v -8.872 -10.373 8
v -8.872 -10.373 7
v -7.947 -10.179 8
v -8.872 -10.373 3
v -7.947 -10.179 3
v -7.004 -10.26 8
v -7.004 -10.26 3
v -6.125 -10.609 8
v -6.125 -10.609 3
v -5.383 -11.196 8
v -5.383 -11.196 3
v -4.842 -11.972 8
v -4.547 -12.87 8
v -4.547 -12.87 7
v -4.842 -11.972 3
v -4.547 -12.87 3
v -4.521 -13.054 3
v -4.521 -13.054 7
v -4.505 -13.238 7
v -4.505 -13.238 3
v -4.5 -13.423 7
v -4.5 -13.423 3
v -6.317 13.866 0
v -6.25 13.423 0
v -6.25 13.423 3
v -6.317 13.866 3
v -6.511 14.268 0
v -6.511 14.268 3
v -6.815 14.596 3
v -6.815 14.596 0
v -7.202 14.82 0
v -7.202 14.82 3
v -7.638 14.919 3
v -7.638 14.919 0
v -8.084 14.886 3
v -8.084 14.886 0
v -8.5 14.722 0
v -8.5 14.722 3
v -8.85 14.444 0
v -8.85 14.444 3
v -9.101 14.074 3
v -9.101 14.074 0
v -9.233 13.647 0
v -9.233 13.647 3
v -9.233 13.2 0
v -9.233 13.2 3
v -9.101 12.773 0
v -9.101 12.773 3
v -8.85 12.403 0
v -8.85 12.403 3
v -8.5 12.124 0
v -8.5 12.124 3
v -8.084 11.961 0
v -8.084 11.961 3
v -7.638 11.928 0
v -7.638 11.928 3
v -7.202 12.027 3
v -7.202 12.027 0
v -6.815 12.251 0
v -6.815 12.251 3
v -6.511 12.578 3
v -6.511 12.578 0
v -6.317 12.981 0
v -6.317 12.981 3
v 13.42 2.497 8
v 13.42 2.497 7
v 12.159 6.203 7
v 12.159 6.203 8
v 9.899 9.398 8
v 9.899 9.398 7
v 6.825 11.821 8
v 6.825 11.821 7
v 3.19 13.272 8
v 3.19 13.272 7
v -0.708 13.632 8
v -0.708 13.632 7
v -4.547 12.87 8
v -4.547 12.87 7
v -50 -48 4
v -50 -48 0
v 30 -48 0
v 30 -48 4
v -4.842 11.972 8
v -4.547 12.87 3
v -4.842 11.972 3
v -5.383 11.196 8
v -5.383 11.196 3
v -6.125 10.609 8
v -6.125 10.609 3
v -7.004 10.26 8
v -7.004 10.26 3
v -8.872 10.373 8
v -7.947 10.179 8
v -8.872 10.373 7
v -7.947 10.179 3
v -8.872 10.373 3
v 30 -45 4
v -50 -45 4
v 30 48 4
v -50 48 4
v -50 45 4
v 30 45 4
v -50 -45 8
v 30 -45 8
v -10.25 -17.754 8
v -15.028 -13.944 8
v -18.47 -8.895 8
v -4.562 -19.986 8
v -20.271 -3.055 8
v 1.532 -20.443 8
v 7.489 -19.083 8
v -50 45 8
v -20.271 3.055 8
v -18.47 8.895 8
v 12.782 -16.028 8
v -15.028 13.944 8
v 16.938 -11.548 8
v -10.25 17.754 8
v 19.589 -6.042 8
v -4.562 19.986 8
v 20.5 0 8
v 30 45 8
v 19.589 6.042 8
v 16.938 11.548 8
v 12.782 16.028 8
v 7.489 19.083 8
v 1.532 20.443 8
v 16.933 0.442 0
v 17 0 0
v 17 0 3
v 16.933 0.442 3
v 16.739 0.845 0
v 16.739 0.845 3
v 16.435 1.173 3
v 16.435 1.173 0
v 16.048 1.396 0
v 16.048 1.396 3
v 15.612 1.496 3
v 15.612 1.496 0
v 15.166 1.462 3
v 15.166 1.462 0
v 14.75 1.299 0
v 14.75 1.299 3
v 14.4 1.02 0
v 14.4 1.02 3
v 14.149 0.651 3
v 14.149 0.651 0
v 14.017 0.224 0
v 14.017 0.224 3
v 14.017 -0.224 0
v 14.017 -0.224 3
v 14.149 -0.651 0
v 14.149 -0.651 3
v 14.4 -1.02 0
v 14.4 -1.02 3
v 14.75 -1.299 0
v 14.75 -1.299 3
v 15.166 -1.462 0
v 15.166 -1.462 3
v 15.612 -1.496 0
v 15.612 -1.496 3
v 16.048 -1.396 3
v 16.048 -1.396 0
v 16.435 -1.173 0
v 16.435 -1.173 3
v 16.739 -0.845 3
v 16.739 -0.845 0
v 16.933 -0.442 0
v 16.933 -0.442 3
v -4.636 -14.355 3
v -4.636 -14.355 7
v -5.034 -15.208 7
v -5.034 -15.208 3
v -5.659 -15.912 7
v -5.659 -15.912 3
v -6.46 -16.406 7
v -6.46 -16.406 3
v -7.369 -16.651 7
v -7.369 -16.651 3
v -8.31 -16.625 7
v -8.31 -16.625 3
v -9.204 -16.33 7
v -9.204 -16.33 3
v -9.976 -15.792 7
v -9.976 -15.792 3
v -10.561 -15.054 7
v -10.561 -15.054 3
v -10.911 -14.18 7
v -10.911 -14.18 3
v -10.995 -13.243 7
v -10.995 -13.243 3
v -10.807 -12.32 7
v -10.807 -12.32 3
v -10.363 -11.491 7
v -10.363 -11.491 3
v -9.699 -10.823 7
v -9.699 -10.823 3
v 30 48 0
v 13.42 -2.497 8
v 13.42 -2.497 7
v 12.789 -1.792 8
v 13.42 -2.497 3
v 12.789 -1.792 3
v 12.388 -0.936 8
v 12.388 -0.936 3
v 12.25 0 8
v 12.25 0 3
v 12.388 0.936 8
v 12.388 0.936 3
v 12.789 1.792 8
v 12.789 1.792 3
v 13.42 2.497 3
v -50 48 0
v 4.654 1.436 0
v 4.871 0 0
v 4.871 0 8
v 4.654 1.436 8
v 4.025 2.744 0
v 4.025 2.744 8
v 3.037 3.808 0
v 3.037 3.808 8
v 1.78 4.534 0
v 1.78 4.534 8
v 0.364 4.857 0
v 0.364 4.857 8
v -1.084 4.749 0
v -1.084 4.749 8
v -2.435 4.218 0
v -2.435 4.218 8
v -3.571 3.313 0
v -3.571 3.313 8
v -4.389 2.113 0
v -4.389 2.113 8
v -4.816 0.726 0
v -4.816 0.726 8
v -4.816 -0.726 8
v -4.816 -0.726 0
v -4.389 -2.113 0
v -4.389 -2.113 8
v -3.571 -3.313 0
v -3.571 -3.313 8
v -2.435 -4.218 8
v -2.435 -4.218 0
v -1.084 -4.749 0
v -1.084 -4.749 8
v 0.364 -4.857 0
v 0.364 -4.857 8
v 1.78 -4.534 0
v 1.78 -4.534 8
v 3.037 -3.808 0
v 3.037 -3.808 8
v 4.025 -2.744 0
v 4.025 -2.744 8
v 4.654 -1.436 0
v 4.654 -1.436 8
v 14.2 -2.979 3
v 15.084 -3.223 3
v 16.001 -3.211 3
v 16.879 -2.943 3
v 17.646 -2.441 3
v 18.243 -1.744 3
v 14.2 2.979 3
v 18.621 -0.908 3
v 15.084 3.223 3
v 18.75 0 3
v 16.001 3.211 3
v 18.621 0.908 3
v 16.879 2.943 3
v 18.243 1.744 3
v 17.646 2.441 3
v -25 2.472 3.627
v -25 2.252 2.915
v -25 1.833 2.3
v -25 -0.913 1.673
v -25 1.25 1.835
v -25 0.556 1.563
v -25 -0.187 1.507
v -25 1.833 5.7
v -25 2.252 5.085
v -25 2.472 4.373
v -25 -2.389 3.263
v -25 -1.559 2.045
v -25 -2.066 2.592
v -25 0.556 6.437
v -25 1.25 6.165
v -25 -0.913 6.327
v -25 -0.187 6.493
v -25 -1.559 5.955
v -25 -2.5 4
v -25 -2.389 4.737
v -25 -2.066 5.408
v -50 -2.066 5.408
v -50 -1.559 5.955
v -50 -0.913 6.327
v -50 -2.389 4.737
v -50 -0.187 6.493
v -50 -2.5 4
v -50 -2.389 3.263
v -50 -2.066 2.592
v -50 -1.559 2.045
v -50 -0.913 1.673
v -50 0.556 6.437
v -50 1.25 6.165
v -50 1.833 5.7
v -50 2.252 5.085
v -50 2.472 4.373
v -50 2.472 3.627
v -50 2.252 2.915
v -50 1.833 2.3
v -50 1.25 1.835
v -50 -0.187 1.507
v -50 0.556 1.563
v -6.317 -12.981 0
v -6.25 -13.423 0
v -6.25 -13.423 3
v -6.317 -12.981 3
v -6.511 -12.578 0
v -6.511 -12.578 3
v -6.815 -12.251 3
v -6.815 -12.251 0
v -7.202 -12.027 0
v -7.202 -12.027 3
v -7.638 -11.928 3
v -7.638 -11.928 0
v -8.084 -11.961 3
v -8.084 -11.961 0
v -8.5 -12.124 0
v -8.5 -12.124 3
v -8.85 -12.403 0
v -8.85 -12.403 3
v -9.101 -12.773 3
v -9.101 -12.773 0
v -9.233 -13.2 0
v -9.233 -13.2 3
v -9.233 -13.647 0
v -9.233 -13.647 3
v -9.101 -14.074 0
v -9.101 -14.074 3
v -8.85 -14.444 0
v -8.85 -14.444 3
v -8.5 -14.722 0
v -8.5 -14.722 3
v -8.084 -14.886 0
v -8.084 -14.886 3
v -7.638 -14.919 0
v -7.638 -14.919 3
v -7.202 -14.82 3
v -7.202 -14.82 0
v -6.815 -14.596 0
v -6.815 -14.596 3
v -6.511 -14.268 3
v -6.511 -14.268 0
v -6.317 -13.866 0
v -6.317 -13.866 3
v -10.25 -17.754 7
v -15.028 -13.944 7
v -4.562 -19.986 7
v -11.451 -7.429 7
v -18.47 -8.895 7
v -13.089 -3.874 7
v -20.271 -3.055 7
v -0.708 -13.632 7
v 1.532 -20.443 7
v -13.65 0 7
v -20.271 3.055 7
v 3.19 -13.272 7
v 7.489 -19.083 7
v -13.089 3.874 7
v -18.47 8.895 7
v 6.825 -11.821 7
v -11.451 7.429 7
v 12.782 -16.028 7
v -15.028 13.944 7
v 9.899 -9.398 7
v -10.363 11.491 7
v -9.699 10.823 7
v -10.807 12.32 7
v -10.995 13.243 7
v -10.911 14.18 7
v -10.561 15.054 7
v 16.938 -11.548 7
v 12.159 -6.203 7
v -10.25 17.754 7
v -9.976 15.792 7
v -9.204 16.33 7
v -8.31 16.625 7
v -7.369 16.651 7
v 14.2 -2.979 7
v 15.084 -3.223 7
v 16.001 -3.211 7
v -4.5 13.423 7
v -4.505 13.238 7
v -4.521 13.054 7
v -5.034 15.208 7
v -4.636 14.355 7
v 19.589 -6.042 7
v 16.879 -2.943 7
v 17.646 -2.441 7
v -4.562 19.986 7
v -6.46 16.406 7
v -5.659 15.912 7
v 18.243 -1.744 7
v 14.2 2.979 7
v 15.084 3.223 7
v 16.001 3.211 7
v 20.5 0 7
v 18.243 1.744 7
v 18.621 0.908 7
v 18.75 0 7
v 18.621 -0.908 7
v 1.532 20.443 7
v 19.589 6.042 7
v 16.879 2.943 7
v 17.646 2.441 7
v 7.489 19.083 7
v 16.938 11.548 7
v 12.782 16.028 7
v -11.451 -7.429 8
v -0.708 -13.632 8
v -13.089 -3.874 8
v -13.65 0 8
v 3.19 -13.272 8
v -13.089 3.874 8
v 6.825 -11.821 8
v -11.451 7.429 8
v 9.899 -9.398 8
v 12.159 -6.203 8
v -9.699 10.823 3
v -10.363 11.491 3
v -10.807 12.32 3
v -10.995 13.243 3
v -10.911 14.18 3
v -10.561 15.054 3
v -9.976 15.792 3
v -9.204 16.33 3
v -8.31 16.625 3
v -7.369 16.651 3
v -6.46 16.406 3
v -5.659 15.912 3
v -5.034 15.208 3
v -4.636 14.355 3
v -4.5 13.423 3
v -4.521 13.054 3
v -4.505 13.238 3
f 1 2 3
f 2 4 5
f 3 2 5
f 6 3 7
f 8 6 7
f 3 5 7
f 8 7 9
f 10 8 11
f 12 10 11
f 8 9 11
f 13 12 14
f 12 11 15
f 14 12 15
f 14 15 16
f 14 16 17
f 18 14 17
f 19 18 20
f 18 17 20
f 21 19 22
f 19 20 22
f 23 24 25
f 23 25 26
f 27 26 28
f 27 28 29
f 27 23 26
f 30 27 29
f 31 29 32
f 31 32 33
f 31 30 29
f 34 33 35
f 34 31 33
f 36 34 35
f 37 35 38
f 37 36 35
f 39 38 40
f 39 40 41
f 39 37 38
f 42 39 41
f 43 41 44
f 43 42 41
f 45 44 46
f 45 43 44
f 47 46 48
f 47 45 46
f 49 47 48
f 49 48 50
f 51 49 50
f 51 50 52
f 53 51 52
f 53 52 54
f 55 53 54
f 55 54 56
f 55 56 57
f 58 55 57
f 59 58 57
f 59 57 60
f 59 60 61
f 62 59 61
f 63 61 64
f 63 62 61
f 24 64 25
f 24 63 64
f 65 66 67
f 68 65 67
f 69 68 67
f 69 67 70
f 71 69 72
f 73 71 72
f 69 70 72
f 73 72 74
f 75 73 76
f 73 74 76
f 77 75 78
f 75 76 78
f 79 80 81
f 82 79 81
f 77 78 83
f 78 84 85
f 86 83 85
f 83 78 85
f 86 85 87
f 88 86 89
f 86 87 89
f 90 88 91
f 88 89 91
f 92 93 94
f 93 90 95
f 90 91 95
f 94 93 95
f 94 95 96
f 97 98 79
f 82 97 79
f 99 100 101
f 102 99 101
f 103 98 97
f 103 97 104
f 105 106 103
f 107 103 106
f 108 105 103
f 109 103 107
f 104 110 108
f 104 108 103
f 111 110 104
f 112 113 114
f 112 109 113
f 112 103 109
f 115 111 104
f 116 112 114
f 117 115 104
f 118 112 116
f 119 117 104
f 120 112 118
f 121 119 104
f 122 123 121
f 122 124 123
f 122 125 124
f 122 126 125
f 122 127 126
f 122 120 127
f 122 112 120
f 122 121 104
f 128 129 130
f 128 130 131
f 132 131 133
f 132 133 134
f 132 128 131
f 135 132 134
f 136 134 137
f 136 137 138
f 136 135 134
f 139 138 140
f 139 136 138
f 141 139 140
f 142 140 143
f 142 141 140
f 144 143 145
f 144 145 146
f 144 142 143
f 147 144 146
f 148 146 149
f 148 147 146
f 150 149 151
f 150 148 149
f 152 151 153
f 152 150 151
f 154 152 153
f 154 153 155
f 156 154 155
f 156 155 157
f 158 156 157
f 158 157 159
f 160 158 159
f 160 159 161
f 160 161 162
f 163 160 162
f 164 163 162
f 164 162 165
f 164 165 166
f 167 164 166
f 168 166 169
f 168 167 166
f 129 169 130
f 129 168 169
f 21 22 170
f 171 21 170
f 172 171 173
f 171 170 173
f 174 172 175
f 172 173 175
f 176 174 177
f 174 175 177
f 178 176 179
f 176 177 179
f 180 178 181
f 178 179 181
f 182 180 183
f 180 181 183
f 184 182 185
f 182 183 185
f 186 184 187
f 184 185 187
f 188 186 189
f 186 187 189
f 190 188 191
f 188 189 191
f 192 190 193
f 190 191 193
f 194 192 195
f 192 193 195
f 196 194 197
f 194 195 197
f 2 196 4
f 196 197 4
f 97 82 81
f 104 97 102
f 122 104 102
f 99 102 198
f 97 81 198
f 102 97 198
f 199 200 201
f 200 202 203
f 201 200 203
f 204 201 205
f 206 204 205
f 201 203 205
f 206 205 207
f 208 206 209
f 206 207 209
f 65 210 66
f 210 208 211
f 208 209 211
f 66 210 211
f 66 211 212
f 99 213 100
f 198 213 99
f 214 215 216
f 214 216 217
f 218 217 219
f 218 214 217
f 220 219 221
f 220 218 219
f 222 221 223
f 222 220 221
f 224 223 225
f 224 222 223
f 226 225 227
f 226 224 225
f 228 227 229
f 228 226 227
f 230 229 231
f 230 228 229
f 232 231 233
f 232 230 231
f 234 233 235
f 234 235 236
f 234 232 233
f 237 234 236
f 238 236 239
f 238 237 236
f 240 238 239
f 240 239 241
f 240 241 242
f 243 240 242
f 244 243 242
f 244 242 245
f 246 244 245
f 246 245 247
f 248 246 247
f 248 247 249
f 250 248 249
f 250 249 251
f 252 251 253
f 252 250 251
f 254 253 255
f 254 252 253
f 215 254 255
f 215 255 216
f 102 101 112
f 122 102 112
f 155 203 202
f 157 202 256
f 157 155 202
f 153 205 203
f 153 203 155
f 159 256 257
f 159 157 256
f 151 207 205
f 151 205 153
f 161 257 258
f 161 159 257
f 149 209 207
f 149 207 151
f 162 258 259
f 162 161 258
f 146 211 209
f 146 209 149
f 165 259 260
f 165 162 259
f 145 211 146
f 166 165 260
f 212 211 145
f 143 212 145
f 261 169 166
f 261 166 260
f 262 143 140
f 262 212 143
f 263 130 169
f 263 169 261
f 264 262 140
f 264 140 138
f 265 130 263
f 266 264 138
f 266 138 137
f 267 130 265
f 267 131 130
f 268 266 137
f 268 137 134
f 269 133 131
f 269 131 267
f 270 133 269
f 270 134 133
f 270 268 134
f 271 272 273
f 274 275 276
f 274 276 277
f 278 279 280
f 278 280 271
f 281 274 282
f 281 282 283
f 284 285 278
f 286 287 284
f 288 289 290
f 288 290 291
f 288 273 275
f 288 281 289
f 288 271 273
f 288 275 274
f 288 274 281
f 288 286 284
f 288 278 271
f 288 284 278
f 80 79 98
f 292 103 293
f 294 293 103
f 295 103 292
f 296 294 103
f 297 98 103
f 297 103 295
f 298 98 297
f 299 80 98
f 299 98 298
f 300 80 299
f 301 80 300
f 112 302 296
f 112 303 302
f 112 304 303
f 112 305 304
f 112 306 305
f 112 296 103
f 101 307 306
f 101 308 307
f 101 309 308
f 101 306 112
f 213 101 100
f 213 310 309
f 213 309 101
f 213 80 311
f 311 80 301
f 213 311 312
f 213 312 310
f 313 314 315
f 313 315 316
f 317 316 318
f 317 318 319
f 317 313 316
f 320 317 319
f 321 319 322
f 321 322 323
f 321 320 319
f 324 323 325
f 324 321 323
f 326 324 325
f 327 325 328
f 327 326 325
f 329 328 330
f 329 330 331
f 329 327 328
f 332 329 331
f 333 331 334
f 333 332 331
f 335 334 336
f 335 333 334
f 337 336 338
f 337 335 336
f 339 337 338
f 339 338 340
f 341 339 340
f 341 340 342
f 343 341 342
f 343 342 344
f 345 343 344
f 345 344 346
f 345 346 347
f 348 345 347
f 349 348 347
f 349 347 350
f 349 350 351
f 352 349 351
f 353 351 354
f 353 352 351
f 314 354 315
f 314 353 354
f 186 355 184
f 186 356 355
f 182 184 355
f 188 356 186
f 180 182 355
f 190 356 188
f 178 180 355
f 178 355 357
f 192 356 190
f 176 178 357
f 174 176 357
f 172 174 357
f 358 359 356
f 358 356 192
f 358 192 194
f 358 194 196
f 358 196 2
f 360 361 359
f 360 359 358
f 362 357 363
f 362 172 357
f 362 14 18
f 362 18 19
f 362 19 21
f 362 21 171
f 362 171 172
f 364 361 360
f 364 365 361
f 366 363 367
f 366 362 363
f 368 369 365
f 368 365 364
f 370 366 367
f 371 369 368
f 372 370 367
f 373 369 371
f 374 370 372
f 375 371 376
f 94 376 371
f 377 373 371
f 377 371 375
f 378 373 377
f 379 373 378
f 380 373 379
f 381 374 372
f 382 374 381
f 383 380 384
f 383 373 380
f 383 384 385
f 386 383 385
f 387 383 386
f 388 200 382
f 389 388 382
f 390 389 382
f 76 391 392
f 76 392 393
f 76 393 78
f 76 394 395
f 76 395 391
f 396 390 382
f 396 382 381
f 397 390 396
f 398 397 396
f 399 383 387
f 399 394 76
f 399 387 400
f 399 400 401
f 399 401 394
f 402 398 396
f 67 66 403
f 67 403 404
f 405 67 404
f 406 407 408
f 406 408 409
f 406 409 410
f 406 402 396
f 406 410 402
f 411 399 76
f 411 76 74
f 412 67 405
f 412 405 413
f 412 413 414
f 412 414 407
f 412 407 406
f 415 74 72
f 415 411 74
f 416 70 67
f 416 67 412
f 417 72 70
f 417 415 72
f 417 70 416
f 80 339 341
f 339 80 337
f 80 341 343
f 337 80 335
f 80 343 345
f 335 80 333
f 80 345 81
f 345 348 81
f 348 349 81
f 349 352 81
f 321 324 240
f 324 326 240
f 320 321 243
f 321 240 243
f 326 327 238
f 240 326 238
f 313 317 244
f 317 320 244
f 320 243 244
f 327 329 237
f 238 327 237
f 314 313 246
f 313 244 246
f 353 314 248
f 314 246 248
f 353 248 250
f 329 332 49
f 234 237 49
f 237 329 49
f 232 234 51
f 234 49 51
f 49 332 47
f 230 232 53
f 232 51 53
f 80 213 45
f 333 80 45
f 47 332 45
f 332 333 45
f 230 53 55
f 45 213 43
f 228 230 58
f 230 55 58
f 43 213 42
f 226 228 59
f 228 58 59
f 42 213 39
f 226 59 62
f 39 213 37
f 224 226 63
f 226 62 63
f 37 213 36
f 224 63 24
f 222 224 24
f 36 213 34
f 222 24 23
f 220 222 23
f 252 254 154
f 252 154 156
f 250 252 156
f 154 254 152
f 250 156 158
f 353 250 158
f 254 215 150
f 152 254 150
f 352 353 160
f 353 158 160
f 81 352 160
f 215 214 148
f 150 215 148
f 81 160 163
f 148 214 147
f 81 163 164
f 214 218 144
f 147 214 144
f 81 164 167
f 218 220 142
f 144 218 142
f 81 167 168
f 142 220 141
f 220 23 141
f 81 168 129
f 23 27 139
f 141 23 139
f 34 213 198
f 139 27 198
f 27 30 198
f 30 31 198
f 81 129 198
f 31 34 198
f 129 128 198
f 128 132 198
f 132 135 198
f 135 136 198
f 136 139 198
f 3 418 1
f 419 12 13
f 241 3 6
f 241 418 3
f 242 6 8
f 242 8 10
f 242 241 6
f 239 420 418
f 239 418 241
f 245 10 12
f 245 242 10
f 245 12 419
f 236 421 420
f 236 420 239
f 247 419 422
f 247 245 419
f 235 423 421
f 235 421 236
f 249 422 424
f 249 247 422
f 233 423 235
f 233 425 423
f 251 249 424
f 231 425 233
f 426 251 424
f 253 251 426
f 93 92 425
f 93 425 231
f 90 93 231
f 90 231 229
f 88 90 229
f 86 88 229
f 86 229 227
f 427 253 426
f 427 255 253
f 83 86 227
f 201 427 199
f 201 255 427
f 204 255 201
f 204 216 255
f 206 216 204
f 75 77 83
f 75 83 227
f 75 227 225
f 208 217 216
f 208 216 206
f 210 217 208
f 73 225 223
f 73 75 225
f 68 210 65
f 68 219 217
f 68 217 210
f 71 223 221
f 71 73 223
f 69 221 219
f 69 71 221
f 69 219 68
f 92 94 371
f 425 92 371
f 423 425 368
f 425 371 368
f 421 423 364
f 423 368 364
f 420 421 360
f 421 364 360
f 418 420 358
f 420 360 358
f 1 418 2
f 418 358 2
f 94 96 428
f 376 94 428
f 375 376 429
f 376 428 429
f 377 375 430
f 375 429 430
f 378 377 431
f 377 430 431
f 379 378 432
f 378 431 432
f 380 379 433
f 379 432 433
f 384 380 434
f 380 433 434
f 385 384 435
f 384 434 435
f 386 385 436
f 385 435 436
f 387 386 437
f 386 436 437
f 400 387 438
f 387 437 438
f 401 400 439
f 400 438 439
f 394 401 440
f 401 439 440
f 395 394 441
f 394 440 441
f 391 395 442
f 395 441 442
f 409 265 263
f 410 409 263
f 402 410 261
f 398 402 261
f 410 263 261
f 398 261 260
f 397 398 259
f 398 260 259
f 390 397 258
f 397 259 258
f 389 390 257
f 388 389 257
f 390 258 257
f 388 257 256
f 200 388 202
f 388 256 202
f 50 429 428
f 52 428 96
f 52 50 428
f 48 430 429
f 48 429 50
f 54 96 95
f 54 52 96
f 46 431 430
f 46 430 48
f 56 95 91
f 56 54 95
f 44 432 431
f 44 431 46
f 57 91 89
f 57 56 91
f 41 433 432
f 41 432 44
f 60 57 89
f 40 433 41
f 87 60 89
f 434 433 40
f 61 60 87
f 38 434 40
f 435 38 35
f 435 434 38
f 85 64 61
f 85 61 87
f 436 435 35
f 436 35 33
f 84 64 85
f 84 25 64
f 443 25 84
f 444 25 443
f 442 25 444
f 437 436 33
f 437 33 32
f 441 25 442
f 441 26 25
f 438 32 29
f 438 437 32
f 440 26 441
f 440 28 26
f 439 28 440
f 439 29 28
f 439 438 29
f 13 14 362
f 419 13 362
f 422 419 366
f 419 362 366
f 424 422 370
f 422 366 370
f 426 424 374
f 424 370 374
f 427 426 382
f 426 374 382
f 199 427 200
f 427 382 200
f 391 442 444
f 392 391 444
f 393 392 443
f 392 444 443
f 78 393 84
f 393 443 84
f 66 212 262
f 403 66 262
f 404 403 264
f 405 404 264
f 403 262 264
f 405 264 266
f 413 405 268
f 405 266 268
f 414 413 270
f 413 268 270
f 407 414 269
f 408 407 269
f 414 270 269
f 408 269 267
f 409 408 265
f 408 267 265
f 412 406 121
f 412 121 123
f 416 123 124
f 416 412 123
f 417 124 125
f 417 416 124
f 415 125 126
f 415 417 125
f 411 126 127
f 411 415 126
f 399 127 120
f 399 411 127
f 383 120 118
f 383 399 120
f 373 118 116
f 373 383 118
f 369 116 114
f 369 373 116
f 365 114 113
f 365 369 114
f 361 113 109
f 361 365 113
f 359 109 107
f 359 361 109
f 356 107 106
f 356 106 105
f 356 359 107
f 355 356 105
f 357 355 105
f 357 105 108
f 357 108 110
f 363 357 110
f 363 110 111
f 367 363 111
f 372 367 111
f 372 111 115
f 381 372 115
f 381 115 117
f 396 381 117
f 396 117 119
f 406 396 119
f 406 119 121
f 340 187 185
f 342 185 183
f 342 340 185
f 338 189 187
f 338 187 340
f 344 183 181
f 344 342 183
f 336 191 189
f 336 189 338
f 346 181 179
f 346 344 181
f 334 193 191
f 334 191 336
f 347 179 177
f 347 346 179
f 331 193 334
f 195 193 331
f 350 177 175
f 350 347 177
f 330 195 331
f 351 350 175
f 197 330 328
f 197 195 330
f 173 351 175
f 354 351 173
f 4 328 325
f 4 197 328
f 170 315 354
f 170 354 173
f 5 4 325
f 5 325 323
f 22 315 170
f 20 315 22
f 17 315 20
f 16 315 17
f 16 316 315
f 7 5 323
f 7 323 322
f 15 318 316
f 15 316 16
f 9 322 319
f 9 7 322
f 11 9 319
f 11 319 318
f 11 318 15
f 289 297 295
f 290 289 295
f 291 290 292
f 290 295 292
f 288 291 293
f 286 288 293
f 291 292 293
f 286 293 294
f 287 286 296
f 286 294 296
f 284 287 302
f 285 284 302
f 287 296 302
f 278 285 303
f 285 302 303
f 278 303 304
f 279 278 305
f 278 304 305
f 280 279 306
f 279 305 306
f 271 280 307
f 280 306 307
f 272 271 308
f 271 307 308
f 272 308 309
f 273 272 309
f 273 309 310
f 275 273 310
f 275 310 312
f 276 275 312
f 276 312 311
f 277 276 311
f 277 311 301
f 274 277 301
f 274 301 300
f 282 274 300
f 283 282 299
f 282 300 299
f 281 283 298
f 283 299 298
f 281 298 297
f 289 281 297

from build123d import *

# Parameters (mm, degrees)
F0_W     = 80
F0_H     = 96
F0_R     = 20.5
F1_DEPTH = 8
F0_R_2   = 4.8708945169
F2_DEPTH = 7
F0_R_3   = 1.5
F3_DEPTH = 3
F4_R     = 2.5
F5_DEPTH = 25
F6_W     = 3
F6_H     = 9.6463483796
F6_H_2   = 12.8309304863
F7_DEPTH = 100


# Not quite as in the source:
# - a feature names something its author has since deleted; it is built from what else it names


with BuildPart() as f1:
    # F0 (on Top) → F1 (new body)
    with BuildSketch(Plane.XY):
        with Locations((-10, 0)):
            Rectangle(F0_W, F0_H)
        Circle(F0_R, mode=Mode.SUBTRACT)
    extrude(amount=F1_DEPTH)



with BuildPart() as f1b:
    # F0 (on Top) → F1, piece 2 (new body)
    with BuildSketch(Plane.XY):
        with BuildLine():
            ThreePointArc((13.4196774194, -2.4969497313), (12.25, 0), (13.4196774194, 2.4969497313))
            ThreePointArc((13.4196774194, 2.4969497313), (6.825, 11.8212467617), (-4.5474168104, 12.8702564214))
            ThreePointArc((-4.5474168104, 12.8702564214), (-6.125, 10.6088111964), (-8.8722606089, 10.3733066901))
            ThreePointArc((-8.8722606089, 10.3733066901), (-13.65, 0), (-8.8722606089, -10.3733066901))
            ThreePointArc((-8.8722606089, -10.3733066901), (-6.125, -10.6088111964), (-4.5474168104, -12.8702564214))
            ThreePointArc((-4.5474168104, -12.8702564214), (6.825, -11.8212467617), (13.4196774194, -2.4969497313))
        make_face()
        Circle(F0_R_2, mode=Mode.SUBTRACT)
    extrude(amount=F1_DEPTH)


with BuildPart() as f1_1:
    add(f1.part)

    add(f1b.part)  # F2 merges F1b
    # F0 (on Top) → F2 (join)
    with BuildSketch(Plane.XY):
        Circle(F0_R)
        with BuildLine():
            ThreePointArc((-4.5474168104, 12.8702564214), (6.825, 11.8212467617), (13.4196774194, 2.4969497313))
            ThreePointArc((13.4196774194, 2.4969497313), (16.8786681277, 2.9430892262), (18.75, 0))
            ThreePointArc((18.75, 0), (16.8786681277, -2.9430892262), (13.4196774194, -2.4969497313))
            ThreePointArc((13.4196774194, -2.4969497313), (6.825, -11.8212467617), (-4.5474168104, -12.8702564214))
            ThreePointArc((-4.5474168104, -12.8702564214), (-4.5118759006, -13.1458107676), (-4.5, -13.4233937587))
            ThreePointArc((-4.5, -13.4233937587), (-9.6094559716, -16.0888999938), (-8.8722606089, -10.3733066901))
            ThreePointArc((-8.8722606089, -10.3733066901), (-13.65, 0), (-8.8722606089, 10.3733066901))
            ThreePointArc((-8.8722606089, 10.3733066901), (-9.6094559716, 16.0888999938), (-4.5, 13.4233937587))
            ThreePointArc((-4.5, 13.4233937587), (-4.5118759006, 13.1458107676), (-4.5474168104, 12.8702564214))
        make_face(mode=Mode.SUBTRACT)
    extrude(amount=F2_DEPTH)

    # F0 (on Top) → F3 (join)
    with BuildSketch(Plane.XY):
        with BuildLine():
            ThreePointArc((-4.5, -13.4233937587), (-4.5118759006, -13.1458107676), (-4.5474168104, -12.8702564214))
            ThreePointArc((-4.5474168104, -12.8702564214), (-6.825, -11.8212467617), (-8.8722606089, -10.3733066901))
            ThreePointArc((-8.8722606089, -10.3733066901), (-9.6094559716, -16.0888999938), (-4.5, -13.4233937587))
        make_face()
        with Locations((-7.75, -13.4233937587)):
            Circle(F0_R_3, mode=Mode.SUBTRACT)
        with BuildLine():
            ThreePointArc((-8.8722606089, -10.3733066901), (-6.825, -11.8212467617), (-4.5474168104, -12.8702564214))
            ThreePointArc((-4.5474168104, -12.8702564214), (-6.125, -10.6088111964), (-8.8722606089, -10.3733066901))
        make_face()
        with BuildLine():
            ThreePointArc((13.4196774194, 2.4969497313), (13.5922973918, 1.2537749451), (13.65, 0))
            ThreePointArc((13.65, 0), (13.5922973918, -1.2537749451), (13.4196774194, -2.4969497313))
            ThreePointArc((13.4196774194, -2.4969497313), (16.8786681277, -2.9430892262), (18.75, 0))
            ThreePointArc((18.75, 0), (16.8786681277, 2.9430892262), (13.4196774194, 2.4969497313))
        make_face()
        with Locations((15.5, 0)):
            Circle(F0_R_3, mode=Mode.SUBTRACT)
        with BuildLine():
            ThreePointArc((13.4196774194, -2.4969497313), (13.5922973918, -1.2537749451), (13.65, 0))
            ThreePointArc((13.65, 0), (13.5922973918, 1.2537749451), (13.4196774194, 2.4969497313))
            ThreePointArc((13.4196774194, 2.4969497313), (12.25, 0), (13.4196774194, -2.4969497313))
        make_face()
        with BuildLine():
            ThreePointArc((-8.8722606089, 10.3733066901), (-6.825, 11.8212467617), (-4.5474168104, 12.8702564214))
            ThreePointArc((-4.5474168104, 12.8702564214), (-4.5118759006, 13.1458107676), (-4.5, 13.4233937587))
            ThreePointArc((-4.5, 13.4233937587), (-9.6094559716, 16.0888999938), (-8.8722606089, 10.3733066901))
        make_face()
        with Locations((-7.75, 13.4233937587)):
            Circle(F0_R_3, mode=Mode.SUBTRACT)
        with BuildLine():
            ThreePointArc((-8.8722606089, 10.3733066901), (-6.125, 10.6088111964), (-4.5474168104, 12.8702564214))
            ThreePointArc((-4.5474168104, 12.8702564214), (-6.825, 11.8212467617), (-8.8722606089, 10.3733066901))
        make_face()
    extrude(amount=F3_DEPTH)

    # F4 (on face) → F5 (cut)
    with BuildSketch(Plane(origin=(-50, 0, 0), x_dir=(0, -1, 0), z_dir=(-1, 0, 0))):
        with Locations((0, 4)):
            Circle(F4_R)
    extrude(amount=-F5_DEPTH, mode=Mode.SUBTRACT)

    # F6 (on face) → F7 (cut)
    with BuildSketch(Plane(origin=(-50, 0, 0), x_dir=(0, -1, 0), z_dir=(-1, 0, 0))):
        with Locations((46.5, 8.8231741898)):
            Rectangle(F6_W, F6_H)
        with Locations((-46.5, 10.4154652432)):
            Rectangle(F6_W, F6_H_2)
    extrude(amount=-F7_DEPTH, mode=Mode.SUBTRACT)


solid = f1_1.part
